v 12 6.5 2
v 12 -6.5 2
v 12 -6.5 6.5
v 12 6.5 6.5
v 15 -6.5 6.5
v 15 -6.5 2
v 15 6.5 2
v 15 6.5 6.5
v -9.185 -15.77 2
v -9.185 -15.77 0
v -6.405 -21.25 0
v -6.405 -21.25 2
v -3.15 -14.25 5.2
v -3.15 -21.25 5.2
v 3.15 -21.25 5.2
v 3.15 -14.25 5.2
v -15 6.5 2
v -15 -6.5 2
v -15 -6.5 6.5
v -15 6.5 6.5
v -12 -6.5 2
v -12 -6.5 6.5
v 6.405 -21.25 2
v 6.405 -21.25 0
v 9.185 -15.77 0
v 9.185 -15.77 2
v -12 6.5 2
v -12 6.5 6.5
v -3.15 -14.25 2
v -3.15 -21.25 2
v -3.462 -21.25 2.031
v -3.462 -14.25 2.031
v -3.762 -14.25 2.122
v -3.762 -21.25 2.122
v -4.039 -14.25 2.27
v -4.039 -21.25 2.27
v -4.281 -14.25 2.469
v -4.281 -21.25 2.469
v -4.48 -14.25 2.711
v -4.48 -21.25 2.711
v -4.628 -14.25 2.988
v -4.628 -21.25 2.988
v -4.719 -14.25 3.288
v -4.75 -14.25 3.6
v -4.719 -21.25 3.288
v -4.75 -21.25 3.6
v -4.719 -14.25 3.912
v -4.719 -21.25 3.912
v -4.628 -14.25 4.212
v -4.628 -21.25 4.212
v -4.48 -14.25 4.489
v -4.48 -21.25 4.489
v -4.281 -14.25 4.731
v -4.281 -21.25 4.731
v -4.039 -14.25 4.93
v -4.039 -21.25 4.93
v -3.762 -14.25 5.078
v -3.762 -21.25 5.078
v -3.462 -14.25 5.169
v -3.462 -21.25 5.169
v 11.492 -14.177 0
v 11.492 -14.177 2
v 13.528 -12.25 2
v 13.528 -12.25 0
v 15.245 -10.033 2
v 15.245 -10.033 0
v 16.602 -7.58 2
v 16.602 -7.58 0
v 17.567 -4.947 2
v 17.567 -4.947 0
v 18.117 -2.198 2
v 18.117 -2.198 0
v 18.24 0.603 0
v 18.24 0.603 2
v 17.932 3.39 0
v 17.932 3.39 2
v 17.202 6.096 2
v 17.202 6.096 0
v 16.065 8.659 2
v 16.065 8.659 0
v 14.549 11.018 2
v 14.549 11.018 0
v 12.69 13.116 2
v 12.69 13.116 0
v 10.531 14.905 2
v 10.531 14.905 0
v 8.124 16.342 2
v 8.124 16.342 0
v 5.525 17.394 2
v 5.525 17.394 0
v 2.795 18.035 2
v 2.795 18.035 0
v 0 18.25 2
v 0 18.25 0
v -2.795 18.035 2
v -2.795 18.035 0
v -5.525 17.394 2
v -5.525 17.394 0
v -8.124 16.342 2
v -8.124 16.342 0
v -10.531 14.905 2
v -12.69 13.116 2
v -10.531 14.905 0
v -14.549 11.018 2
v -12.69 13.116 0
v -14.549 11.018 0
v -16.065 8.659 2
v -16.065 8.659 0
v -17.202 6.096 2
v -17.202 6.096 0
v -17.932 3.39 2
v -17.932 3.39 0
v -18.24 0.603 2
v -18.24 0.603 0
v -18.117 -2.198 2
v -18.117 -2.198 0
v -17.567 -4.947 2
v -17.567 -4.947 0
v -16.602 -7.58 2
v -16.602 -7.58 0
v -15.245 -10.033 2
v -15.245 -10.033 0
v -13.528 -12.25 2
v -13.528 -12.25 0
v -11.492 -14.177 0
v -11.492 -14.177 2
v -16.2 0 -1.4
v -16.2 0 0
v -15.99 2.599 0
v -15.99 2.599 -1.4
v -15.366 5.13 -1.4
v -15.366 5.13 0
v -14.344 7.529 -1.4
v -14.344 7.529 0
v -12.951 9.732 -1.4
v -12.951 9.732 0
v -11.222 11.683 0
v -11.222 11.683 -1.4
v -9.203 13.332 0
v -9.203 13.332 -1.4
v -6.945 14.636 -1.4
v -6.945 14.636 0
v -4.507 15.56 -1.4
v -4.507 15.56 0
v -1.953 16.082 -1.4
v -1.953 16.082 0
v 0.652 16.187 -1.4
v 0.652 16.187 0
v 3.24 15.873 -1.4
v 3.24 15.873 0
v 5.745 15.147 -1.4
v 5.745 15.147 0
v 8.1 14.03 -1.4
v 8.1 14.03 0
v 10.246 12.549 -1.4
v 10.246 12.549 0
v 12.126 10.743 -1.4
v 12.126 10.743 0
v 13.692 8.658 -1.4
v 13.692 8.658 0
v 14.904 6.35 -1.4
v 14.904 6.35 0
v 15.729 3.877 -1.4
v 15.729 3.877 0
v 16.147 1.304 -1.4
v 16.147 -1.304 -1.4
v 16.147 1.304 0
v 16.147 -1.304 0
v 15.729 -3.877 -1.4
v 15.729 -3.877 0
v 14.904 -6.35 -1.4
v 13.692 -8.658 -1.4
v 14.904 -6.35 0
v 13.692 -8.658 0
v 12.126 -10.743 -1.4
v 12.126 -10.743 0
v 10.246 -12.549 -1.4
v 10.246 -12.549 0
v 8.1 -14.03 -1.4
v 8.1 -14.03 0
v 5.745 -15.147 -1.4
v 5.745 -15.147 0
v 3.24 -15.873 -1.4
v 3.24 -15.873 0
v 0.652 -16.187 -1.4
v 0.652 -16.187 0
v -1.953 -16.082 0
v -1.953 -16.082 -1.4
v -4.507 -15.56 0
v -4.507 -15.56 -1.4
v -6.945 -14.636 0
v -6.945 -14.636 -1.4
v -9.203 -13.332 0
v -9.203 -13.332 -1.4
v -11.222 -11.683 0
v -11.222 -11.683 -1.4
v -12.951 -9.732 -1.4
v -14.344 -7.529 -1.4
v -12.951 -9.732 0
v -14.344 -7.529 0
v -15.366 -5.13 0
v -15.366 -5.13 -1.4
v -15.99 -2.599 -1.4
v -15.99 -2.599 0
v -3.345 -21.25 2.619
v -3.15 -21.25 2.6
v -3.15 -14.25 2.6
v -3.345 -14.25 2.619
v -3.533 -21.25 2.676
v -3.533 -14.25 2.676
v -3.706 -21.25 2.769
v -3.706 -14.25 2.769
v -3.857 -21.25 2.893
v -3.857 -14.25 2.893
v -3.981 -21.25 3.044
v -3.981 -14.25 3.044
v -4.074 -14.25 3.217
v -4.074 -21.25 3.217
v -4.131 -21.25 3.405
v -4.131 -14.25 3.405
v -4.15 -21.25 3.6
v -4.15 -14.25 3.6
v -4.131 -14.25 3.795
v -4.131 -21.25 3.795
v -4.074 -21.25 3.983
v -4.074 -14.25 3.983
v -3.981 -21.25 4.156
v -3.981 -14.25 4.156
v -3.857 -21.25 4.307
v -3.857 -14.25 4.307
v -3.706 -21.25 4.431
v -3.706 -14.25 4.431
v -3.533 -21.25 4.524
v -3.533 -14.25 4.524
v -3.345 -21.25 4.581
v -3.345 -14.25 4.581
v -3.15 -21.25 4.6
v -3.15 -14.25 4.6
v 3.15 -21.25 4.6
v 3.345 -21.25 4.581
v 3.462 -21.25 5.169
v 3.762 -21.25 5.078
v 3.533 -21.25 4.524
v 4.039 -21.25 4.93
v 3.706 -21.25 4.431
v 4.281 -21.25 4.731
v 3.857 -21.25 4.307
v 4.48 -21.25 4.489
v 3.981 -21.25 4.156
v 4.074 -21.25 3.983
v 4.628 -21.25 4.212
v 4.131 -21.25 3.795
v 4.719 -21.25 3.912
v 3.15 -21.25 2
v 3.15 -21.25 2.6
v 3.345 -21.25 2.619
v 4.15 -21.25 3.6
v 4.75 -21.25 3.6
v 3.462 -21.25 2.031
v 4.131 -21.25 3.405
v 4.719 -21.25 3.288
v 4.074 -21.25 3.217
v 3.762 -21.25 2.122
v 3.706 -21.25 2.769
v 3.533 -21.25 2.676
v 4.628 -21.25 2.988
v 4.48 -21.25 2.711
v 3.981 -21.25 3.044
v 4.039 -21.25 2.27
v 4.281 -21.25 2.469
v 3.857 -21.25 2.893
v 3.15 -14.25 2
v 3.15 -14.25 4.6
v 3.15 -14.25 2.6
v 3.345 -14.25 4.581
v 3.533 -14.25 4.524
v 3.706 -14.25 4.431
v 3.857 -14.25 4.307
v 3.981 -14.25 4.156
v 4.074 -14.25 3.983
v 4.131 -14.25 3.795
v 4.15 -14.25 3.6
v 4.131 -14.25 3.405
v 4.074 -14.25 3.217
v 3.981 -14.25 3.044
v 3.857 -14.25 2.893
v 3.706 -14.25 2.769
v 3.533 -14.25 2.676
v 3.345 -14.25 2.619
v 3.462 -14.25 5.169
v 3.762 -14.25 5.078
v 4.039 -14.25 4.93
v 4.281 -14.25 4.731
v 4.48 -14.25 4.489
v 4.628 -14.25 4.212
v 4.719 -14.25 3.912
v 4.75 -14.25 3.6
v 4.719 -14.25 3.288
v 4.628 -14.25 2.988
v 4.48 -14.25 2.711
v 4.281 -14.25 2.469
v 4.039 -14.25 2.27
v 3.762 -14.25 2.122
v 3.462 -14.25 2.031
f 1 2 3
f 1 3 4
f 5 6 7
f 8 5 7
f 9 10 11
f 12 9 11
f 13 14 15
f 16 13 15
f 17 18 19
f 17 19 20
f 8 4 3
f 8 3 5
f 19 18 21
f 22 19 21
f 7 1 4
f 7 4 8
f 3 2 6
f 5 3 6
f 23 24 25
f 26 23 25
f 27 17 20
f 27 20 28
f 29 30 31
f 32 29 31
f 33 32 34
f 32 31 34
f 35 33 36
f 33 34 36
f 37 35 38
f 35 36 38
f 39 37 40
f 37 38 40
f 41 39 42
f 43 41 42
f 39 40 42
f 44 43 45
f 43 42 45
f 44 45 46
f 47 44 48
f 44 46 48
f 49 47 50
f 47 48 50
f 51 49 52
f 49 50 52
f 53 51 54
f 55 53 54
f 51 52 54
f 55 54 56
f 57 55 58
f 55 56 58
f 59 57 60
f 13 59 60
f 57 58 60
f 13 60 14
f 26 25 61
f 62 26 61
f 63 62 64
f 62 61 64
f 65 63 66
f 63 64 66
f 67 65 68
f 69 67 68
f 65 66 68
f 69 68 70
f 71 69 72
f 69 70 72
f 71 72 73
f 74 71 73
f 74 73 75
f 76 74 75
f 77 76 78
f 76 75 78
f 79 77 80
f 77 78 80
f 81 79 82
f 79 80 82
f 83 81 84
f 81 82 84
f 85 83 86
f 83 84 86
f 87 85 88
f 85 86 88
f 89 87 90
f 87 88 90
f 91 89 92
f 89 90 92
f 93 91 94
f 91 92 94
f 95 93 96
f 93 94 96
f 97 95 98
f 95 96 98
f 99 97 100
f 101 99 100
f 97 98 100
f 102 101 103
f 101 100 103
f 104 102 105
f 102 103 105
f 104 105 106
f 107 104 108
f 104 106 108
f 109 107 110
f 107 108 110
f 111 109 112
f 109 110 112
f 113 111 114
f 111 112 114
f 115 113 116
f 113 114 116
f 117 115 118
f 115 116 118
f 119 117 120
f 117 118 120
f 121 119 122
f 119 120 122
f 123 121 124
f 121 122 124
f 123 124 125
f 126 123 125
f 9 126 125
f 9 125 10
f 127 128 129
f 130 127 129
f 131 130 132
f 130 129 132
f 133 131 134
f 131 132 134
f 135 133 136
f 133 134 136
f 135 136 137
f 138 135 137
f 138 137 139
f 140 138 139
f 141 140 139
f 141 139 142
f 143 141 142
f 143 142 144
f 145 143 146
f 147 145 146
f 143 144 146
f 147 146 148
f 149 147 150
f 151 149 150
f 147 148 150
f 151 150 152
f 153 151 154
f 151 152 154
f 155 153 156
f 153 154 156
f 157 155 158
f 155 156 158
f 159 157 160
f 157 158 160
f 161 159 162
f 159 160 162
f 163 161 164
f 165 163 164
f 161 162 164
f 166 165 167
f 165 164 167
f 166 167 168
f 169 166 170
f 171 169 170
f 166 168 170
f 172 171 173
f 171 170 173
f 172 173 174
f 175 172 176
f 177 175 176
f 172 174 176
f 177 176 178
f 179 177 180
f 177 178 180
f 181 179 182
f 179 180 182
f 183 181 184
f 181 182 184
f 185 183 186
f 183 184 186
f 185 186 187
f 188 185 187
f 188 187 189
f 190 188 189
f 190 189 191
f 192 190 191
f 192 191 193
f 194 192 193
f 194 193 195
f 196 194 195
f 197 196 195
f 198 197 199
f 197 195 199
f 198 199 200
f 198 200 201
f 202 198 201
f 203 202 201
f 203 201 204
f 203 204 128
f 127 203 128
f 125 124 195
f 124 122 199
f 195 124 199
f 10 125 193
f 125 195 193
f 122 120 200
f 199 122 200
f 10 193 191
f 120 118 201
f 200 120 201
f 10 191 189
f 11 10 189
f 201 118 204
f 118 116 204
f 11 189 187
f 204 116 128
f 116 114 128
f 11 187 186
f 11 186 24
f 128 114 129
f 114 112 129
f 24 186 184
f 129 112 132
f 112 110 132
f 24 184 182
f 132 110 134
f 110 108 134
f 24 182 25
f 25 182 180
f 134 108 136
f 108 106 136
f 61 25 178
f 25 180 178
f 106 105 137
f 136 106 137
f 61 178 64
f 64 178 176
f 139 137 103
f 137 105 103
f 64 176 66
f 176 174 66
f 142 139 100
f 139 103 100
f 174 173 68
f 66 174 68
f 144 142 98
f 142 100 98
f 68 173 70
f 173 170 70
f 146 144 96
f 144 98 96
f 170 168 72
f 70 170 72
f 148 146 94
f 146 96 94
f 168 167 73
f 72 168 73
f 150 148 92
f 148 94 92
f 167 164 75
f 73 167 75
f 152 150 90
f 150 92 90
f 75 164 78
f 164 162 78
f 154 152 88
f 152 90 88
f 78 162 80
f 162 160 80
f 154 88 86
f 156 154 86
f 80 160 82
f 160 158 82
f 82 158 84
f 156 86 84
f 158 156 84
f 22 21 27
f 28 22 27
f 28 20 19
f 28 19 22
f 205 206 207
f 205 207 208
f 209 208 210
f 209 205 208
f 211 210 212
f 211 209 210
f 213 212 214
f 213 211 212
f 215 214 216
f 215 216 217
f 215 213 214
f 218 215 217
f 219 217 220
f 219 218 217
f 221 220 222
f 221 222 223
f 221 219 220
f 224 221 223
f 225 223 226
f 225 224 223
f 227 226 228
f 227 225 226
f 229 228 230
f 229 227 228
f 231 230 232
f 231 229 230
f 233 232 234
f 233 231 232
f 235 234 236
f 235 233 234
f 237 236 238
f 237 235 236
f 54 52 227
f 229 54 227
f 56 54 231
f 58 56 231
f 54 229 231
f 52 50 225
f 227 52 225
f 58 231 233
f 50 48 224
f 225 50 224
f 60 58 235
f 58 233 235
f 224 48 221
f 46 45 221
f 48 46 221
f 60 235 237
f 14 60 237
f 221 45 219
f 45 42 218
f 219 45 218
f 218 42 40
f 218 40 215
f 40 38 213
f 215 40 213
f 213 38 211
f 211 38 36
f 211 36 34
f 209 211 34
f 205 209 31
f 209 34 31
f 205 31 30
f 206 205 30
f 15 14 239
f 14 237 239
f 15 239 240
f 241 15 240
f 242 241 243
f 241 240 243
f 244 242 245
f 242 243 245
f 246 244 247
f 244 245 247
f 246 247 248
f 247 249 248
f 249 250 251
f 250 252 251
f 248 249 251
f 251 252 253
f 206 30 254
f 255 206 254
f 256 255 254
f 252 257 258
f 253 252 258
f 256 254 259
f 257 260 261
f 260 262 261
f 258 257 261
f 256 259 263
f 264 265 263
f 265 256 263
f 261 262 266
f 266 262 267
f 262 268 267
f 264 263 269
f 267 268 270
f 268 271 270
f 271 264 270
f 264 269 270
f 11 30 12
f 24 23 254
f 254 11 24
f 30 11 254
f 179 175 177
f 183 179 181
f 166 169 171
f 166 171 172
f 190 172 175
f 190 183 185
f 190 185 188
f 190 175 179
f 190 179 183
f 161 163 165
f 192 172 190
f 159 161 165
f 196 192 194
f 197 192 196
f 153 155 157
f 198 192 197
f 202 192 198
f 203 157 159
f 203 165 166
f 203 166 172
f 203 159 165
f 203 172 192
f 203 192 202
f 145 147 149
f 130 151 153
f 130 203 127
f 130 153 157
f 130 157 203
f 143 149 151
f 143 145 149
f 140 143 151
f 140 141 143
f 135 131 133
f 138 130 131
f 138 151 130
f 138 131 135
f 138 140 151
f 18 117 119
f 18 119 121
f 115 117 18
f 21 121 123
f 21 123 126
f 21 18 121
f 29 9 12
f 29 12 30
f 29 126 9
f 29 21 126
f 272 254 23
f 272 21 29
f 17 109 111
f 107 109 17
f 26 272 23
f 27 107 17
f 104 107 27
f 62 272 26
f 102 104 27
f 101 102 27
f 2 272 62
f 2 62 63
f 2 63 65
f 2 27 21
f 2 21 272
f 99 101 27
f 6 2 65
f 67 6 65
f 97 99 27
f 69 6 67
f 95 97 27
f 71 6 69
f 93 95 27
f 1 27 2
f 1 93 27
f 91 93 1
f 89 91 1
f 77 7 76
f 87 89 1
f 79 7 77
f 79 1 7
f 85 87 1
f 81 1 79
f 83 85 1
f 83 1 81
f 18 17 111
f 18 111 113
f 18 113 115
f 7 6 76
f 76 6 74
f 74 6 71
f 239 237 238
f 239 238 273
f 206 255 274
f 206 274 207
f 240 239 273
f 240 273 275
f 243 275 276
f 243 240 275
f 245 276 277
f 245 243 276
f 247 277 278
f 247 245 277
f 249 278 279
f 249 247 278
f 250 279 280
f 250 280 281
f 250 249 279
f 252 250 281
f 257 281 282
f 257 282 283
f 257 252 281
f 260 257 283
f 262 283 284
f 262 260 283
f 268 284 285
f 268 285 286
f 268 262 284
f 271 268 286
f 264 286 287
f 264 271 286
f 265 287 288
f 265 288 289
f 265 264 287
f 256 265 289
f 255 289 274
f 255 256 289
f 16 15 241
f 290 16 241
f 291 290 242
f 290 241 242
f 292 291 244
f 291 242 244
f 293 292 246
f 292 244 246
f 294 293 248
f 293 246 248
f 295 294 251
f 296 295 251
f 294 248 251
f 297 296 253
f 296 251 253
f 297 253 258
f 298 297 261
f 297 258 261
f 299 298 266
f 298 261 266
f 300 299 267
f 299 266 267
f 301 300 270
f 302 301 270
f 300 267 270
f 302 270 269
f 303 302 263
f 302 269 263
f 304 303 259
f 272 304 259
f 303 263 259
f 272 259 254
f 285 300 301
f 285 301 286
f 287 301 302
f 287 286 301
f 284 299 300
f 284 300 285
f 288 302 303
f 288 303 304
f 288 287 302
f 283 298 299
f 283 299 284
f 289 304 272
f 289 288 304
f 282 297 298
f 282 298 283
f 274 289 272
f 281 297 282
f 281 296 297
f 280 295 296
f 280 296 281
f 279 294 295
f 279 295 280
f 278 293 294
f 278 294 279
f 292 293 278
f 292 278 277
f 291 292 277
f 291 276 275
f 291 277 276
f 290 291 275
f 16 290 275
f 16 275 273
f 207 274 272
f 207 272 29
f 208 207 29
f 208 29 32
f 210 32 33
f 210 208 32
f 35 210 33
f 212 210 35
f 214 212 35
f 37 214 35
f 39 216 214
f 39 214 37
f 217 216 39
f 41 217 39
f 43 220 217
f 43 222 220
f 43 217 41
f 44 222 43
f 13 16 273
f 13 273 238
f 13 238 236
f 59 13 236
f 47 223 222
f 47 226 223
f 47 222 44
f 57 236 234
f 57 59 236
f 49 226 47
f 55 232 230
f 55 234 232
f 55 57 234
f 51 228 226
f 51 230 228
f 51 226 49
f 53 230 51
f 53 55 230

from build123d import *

# Parameters (mm, degrees)
EXTRUDE_1_DEPTH = 2
SKETCH_2_R      = 16.2
EXTRUDE_2_DEPTH = 1.4
SKETCH_3_W      = 3
SKETCH_3_H      = 13
EXTRUDE_3_DEPTH = 4.5
EXTRUDE_4_DEPTH = 7


with BuildPart() as part:
    # 草图1 → 凸台-拉伸1 (new body)
    with BuildSketch(Plane.XY):
        with BuildLine():
            Line((-6.405, -21.250170418), (6.405, -21.250170418))
            Line((6.405, -21.250170418), (9.185, -15.770170418))
            ThreePointArc((9.185, -15.770170418), (0, 18.25), (-9.185, -15.770170418))
            Line((-9.185, -15.770170418), (-6.405, -21.250170418))
        make_face()
    extrude(amount=EXTRUDE_1_DEPTH)

    # 草图2 → 凸台-拉伸2 (add)
    with BuildSketch(Plane(origin=(0, 0, 0), x_dir=(-1, 0, 0), z_dir=(0, 0, -1))):
        Circle(SKETCH_2_R)
    extrude(amount=EXTRUDE_2_DEPTH)

    # 草图3 → 凸台-拉伸3 (add)
    with BuildSketch(Plane.XY.offset(2)):
        with Locations((-13.5, 0)):
            Rectangle(SKETCH_3_W, SKETCH_3_H)
        with Locations((13.5, 0)):
            Rectangle(SKETCH_3_W, SKETCH_3_H)
    extrude(amount=EXTRUDE_3_DEPTH)

    # 草图4 → 凸台-拉伸4 (add)
    with BuildSketch(Plane.XZ.offset(21.250170418)):
        with BuildLine():
            Line((-3.15, 5.2), (3.15, 5.2))
            ThreePointArc((3.15, 5.2), (4.75, 3.6), (3.15, 2))
            Line((3.15, 2), (-3.15, 2))
            ThreePointArc((-3.15, 2), (-4.75, 3.6), (-3.15, 5.2))
        make_face()
        with BuildLine():
            Line((-3.15, 4.6), (3.15, 4.6))
            ThreePointArc((3.15, 4.6), (4.15, 3.6), (3.15, 2.6))
            Line((3.15, 2.6), (-3.15, 2.6))
            ThreePointArc((-3.15, 2.6), (-4.15, 3.6), (-3.15, 4.6))
        make_face(mode=Mode.SUBTRACT)
    extrude(amount=-EXTRUDE_4_DEPTH)


solid = part.part
